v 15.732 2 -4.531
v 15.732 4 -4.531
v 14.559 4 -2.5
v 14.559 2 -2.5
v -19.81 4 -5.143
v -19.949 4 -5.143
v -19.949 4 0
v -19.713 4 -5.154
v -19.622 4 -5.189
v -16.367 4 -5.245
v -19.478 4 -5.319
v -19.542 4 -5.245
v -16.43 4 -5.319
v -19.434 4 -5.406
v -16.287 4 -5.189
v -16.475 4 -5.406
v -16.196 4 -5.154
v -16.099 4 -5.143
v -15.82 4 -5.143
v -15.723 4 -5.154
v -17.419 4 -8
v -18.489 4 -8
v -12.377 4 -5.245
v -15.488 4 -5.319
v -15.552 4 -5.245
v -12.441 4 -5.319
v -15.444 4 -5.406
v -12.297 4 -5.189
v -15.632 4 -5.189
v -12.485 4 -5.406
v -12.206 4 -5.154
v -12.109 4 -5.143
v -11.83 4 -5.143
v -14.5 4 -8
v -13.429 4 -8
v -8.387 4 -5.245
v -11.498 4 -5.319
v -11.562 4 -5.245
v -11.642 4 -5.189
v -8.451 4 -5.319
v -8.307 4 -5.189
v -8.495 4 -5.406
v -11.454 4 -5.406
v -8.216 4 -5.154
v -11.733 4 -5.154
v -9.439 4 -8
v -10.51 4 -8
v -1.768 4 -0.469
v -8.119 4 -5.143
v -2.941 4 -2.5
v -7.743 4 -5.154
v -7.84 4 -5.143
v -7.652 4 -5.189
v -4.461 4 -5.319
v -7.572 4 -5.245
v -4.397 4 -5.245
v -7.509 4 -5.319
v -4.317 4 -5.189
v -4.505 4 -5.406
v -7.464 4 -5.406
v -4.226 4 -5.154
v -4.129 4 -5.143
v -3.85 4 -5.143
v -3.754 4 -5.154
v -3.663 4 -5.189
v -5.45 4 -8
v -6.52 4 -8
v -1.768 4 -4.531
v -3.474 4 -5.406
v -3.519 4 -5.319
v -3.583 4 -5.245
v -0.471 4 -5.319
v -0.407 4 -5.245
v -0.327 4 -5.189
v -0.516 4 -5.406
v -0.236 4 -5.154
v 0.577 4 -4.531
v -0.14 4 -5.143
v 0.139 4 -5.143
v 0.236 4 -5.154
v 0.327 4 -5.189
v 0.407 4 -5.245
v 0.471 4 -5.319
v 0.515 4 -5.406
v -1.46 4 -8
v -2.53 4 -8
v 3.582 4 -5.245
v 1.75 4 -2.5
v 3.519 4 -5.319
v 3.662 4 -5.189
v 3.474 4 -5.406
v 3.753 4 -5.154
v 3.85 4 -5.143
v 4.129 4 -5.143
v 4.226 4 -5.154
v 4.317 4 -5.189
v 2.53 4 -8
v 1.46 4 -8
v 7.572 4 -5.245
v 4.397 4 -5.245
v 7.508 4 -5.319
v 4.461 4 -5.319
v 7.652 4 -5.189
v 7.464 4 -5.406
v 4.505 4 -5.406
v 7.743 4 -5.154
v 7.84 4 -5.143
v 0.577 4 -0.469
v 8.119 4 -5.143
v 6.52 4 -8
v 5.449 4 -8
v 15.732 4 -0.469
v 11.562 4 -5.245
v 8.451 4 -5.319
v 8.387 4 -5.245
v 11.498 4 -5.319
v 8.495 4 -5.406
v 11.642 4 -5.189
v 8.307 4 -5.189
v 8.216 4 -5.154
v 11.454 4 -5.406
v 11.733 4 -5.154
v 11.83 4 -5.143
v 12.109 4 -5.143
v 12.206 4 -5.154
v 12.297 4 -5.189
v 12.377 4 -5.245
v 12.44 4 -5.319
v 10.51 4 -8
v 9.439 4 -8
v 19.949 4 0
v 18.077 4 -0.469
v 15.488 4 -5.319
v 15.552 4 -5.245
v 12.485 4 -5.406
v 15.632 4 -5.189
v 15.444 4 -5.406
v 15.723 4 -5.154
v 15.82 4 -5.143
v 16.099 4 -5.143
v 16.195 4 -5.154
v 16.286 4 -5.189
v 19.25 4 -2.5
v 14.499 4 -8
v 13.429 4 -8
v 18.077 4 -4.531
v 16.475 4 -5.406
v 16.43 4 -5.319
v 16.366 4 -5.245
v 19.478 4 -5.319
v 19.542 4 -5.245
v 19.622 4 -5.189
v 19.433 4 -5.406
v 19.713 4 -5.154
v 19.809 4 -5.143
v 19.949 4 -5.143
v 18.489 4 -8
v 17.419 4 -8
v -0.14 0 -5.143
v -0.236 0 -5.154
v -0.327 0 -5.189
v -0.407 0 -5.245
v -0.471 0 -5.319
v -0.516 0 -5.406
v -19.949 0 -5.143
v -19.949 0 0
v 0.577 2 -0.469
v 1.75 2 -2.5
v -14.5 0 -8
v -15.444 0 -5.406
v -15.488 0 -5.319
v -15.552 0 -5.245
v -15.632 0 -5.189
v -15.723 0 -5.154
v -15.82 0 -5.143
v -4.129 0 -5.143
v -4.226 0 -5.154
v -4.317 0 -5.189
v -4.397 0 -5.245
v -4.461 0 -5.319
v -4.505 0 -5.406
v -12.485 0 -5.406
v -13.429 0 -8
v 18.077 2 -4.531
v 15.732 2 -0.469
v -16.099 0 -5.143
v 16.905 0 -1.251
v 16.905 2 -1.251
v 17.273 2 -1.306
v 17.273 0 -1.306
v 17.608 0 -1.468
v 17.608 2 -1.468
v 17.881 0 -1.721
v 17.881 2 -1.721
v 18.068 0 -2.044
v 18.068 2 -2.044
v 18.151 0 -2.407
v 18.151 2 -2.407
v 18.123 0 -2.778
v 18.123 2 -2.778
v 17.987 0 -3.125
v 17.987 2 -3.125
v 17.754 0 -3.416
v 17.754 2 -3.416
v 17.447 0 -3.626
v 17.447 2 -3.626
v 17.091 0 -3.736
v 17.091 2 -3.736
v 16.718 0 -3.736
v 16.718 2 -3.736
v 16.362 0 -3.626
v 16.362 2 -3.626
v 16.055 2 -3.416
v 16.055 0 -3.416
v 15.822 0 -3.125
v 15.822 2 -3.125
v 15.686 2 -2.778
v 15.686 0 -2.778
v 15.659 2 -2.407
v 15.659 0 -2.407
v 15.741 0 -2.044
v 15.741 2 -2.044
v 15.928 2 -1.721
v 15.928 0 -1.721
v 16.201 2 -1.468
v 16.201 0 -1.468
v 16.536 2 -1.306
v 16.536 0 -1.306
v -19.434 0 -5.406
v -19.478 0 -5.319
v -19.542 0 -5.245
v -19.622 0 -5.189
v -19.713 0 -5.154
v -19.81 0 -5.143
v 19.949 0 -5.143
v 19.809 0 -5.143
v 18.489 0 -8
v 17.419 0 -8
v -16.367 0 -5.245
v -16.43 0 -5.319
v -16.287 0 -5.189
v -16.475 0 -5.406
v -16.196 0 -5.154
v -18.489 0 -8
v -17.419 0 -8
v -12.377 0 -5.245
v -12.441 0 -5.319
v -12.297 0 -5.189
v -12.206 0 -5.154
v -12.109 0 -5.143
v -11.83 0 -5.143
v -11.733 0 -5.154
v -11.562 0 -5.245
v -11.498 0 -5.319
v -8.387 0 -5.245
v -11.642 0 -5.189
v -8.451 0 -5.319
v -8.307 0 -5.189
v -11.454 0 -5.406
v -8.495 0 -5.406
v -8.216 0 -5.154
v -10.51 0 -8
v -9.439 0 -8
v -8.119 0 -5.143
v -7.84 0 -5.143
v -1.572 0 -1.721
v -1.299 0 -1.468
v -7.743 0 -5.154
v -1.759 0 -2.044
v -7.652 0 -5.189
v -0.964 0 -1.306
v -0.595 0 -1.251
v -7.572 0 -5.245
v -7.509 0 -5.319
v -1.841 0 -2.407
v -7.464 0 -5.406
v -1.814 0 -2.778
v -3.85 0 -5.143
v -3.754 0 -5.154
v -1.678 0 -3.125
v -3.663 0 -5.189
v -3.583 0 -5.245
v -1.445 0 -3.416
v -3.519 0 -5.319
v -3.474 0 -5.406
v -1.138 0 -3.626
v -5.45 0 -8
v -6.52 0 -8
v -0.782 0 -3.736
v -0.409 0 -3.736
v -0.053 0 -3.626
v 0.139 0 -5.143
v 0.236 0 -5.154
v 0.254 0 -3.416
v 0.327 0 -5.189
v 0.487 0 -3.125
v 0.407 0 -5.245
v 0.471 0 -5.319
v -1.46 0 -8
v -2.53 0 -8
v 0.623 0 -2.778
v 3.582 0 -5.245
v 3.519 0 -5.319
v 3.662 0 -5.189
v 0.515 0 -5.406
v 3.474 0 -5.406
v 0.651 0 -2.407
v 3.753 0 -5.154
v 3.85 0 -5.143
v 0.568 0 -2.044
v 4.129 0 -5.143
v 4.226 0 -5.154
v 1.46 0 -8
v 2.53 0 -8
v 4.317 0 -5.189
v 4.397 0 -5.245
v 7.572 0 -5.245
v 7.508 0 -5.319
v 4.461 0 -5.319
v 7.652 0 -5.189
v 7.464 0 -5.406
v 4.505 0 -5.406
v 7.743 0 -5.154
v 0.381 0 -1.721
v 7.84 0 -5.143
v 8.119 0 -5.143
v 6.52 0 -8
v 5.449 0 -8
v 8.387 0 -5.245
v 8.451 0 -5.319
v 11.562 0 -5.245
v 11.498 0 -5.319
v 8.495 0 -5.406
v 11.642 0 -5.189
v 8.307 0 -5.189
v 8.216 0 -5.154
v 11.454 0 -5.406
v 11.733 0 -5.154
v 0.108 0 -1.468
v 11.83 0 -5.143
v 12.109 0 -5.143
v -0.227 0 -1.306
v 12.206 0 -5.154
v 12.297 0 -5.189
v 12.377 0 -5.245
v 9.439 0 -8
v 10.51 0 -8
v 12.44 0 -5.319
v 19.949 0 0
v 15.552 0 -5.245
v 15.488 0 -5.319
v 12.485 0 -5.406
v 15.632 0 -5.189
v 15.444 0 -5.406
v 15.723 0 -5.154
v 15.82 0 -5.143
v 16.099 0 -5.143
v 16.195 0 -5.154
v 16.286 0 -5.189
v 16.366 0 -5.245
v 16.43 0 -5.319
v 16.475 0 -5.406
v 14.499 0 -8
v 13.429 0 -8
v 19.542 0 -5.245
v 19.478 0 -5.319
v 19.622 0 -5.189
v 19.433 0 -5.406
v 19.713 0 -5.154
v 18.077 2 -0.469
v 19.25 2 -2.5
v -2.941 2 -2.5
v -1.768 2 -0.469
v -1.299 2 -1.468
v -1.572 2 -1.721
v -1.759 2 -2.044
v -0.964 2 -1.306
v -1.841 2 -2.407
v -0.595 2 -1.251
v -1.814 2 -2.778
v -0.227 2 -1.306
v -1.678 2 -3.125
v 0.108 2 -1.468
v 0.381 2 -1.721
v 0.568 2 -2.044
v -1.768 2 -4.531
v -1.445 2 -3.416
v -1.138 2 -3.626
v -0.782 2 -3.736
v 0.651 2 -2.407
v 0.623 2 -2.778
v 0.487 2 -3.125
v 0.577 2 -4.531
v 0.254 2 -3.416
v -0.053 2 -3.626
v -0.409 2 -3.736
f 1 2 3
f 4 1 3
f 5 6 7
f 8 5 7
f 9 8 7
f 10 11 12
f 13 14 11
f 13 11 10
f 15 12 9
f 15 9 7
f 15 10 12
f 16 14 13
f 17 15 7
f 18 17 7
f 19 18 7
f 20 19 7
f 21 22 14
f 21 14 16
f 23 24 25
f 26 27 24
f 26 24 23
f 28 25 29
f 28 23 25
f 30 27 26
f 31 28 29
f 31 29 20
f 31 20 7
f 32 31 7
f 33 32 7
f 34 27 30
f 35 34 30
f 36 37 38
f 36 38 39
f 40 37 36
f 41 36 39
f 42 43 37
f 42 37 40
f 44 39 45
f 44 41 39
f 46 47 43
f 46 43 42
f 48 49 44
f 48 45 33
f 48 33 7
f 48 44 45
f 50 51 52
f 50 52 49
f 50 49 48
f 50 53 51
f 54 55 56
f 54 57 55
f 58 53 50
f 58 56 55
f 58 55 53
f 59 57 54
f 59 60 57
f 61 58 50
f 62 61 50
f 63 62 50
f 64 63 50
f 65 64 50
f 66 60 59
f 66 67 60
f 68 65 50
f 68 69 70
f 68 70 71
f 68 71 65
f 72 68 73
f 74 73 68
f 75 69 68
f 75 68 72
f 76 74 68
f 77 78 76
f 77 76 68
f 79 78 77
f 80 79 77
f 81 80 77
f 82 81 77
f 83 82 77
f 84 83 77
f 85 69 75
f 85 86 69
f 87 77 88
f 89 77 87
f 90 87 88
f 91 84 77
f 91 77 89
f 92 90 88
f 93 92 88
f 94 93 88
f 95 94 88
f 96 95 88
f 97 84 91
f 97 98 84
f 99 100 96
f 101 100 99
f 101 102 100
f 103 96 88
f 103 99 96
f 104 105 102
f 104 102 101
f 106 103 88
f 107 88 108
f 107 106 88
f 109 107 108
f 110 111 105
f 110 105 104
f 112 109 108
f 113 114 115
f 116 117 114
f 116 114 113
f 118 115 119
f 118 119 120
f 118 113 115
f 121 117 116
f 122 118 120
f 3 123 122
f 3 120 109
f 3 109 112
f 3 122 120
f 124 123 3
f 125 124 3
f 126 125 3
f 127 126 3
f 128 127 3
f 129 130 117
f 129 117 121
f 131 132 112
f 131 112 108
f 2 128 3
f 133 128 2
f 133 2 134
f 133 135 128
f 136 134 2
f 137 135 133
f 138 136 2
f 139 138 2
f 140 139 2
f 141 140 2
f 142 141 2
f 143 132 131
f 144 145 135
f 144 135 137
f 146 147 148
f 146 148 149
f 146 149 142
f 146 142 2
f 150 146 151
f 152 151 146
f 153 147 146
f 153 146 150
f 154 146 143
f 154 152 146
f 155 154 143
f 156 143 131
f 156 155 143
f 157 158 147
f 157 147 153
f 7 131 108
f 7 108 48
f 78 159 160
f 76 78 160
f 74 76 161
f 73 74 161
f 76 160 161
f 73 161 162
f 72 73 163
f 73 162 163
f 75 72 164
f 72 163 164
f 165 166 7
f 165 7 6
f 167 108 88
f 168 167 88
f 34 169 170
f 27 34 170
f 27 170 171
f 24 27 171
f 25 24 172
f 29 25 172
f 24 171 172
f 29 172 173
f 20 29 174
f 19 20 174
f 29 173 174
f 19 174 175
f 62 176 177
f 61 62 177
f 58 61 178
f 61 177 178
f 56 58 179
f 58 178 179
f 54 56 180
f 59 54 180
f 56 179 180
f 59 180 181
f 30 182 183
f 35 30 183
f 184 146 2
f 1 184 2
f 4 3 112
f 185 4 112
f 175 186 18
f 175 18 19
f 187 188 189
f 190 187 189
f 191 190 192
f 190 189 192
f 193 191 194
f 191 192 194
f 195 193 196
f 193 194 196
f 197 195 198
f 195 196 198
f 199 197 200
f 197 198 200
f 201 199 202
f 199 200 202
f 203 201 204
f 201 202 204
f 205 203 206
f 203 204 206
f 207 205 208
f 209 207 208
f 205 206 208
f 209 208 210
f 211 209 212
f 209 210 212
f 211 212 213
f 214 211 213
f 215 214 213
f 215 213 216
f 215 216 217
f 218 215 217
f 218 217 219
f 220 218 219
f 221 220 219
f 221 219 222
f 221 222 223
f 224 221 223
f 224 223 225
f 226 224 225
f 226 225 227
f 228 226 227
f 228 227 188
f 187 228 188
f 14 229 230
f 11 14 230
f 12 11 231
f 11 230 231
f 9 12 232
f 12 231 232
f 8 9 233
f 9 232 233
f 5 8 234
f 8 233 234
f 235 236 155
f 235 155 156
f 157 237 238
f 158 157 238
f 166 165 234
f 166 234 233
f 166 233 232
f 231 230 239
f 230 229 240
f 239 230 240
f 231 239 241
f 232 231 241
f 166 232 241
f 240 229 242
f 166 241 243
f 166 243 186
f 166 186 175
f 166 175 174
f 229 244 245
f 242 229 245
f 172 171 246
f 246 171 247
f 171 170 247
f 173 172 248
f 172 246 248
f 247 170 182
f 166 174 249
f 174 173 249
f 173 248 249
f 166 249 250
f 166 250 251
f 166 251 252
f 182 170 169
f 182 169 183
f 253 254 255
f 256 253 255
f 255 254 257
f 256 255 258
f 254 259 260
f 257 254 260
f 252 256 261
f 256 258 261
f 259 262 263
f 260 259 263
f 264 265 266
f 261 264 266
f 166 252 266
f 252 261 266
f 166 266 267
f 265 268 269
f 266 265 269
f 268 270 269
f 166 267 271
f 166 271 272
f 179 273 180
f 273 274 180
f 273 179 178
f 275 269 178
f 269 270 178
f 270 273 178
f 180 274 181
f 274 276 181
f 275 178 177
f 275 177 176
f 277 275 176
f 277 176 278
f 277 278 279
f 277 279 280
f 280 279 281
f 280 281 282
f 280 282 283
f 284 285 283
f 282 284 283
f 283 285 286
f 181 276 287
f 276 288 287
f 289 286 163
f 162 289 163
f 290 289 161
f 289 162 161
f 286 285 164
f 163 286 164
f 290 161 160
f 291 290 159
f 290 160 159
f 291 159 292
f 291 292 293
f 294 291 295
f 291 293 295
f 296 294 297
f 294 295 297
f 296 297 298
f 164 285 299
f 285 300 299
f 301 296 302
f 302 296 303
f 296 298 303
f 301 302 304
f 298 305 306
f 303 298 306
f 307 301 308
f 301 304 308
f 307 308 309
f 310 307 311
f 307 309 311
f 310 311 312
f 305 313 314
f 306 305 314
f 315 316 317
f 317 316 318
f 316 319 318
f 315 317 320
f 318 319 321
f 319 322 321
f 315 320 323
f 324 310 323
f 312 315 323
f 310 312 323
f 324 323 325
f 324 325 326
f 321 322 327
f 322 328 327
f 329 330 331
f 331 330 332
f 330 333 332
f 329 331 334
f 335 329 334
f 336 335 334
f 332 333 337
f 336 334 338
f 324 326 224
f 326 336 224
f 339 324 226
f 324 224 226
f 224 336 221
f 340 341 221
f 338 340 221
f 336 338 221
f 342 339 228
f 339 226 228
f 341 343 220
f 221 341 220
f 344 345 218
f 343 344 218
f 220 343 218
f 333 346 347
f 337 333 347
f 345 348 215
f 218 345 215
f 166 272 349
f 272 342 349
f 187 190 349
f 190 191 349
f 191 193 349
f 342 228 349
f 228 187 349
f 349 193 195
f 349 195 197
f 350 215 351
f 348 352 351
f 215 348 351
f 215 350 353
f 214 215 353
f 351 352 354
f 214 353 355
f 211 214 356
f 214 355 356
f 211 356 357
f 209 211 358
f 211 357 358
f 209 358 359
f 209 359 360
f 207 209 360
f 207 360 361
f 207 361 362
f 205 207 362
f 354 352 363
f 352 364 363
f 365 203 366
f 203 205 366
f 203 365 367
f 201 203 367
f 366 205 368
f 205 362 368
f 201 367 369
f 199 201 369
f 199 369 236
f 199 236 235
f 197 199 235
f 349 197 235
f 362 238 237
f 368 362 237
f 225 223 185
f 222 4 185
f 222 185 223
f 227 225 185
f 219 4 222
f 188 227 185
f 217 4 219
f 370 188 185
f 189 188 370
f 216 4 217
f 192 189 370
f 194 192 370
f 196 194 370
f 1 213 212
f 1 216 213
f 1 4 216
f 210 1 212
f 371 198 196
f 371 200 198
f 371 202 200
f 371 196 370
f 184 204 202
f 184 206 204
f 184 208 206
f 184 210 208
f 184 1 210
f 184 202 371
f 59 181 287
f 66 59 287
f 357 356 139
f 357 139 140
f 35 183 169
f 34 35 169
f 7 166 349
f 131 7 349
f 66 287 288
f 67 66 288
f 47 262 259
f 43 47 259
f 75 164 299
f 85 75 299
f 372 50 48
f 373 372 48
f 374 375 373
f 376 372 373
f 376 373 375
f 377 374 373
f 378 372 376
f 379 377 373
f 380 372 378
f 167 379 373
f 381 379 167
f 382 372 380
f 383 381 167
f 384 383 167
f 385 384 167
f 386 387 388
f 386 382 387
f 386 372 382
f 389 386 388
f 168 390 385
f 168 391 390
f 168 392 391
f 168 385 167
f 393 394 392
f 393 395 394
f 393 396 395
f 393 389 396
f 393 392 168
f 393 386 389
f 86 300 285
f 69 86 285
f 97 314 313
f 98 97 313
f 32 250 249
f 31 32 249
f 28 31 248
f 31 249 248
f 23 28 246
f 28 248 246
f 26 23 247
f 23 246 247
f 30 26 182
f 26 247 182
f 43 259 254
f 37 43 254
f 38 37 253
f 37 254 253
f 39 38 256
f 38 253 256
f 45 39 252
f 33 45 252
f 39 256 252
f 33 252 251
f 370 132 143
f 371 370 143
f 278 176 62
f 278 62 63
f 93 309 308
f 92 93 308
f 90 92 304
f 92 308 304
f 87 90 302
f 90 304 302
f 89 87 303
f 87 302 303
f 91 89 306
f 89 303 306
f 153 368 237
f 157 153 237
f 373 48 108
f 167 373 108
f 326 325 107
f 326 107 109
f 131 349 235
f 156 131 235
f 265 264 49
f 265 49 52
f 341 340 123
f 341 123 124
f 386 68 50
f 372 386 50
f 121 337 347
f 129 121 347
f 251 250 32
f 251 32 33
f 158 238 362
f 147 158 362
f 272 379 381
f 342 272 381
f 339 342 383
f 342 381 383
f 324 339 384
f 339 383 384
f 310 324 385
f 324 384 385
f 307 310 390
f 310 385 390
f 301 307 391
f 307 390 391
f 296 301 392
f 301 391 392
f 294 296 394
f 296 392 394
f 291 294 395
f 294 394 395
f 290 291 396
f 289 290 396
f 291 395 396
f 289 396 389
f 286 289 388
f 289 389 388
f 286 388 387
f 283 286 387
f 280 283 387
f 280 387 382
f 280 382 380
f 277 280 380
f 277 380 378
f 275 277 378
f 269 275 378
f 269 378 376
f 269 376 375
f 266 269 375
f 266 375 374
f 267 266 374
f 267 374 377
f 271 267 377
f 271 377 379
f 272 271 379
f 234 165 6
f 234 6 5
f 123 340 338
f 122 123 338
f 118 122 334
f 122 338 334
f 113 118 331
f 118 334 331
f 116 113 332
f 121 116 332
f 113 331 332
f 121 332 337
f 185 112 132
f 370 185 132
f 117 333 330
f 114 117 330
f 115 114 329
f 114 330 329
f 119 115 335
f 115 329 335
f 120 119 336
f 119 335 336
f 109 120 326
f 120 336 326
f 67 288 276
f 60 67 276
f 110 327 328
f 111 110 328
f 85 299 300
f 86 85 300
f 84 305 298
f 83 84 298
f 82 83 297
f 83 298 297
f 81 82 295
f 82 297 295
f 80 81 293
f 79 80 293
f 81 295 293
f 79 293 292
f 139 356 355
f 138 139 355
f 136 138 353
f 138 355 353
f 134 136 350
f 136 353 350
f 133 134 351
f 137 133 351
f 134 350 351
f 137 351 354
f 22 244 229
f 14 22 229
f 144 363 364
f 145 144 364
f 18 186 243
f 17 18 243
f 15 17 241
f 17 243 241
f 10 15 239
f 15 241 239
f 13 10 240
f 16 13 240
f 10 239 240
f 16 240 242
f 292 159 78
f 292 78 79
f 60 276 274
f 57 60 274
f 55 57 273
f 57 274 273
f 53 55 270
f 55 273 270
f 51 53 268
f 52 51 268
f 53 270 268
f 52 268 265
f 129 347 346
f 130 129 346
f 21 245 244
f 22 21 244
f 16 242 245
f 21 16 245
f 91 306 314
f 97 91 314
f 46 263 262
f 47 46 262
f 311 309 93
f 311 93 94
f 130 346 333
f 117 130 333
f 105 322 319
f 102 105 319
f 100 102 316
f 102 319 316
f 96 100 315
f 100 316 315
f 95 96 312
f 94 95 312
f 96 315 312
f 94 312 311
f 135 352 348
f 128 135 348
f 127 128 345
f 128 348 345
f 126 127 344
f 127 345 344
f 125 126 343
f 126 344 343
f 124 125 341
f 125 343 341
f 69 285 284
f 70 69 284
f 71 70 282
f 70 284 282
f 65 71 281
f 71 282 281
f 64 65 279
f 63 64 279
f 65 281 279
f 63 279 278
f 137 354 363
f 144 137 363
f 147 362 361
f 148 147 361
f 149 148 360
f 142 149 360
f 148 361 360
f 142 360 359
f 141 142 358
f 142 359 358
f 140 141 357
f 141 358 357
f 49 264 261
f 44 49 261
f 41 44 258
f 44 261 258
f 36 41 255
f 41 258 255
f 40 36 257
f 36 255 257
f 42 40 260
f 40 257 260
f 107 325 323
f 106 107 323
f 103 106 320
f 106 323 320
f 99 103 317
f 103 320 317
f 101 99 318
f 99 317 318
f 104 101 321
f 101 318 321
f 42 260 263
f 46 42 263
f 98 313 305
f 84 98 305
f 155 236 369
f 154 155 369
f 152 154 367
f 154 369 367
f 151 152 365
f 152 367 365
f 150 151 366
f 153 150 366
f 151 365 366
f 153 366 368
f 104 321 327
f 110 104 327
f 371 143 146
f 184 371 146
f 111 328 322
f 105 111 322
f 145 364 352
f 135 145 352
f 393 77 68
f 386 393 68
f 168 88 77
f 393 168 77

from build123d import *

# Parameters (mm, degrees)
SKETCH1_W           = 39.8982184
SKETCH1_H           = 5.1425094
BOSS_EXTRUDE1_DEPTH = 3.999992
BOSS_EXTRUDE2_START = -3.999992
BOSS_EXTRUDE2_DEPTH = 3.999992
CUT_EXTRUDE4_DEPTH  = 1.999996
SKETCH4_R           = 1.2494895
CUT_EXTRUDE5_DEPTH  = 22.586264202


# Read off the part's stored shape, not the designer's step: Boss-Extrude2
with BuildPart() as part:
    # Sketch1 → Boss-Extrude1 (new body)
    with BuildSketch(Plane(origin=(0, 0, 0), x_dir=(1, 0, 0), z_dir=(0, 1, 0))):
        with Locations((0, 2.5712547)):
            Rectangle(SKETCH1_W, SKETCH1_H)
    extrude(amount=BOSS_EXTRUDE1_DEPTH)

    # Boss-Extrude2 outline → Boss-Extrude2 (add)
    with BuildSketch(Plane(origin=(0, 3.999992, 0), x_dir=(1, 0, 0), z_dir=(0, 1, 0)).offset(BOSS_EXTRUDE2_START)):
        with BuildLine():
            Line((-19.809521572, 5.1425094), (-16.098890229, 5.1425094))
            ThreePointArc((-16.098890229, 5.1425094), (-16.328307217, 5.214844403), (-16.4747448, 5.405686069))
            Line((-16.4747448, 5.405686069), (-17.4189898, 7.999991269))
            Line((-17.4189898, 7.999991269), (-18.489422, 7.999991269))
            Line((-18.489422, 7.999991269), (-19.433667, 5.405686069))
            ThreePointArc((-19.433667, 5.405686069), (-19.580104584, 5.214844403), (-19.809521572, 5.1425094))
        make_face()
        with BuildLine():
            Line((-15.819722635, 5.1425094), (-12.109091292, 5.1425094))
            ThreePointArc((-12.109091292, 5.1425094), (-12.33850828, 5.214844403), (-12.484945863, 5.405686069))
            Line((-12.484945863, 5.405686069), (-13.429190863, 7.999991269))
            Line((-13.429190863, 7.999991269), (-14.499623063, 7.999991269))
            Line((-14.499623063, 7.999991269), (-15.443868063, 5.405686069))
            ThreePointArc((-15.443868063, 5.405686069), (-15.590305646, 5.214844403), (-15.819722635, 5.1425094))
        make_face()
        with BuildLine():
            Line((-11.829923697, 5.1425094), (-8.119292355, 5.1425094))
            ThreePointArc((-8.119292355, 5.1425094), (-8.348709343, 5.214844403), (-8.495146926, 5.405686069))
            Line((-8.495146926, 5.405686069), (-9.439391926, 7.999991269))
            Line((-9.439391926, 7.999991269), (-10.509824126, 7.999991269))
            Line((-10.509824126, 7.999991269), (-11.454069126, 5.405686069))
            ThreePointArc((-11.454069126, 5.405686069), (-11.600506709, 5.214844403), (-11.829923697, 5.1425094))
        make_face()
        with BuildLine():
            Line((-7.84012476, 5.1425094), (-4.129493418, 5.1425094))
            ThreePointArc((-4.129493418, 5.1425094), (-4.358910406, 5.214844403), (-4.505347989, 5.405686069))
            Line((-4.505347989, 5.405686069), (-5.449592989, 7.999991269))
            Line((-5.449592989, 7.999991269), (-6.520025189, 7.999991269))
            Line((-6.520025189, 7.999991269), (-7.464270189, 5.405686069))
            ThreePointArc((-7.464270189, 5.405686069), (-7.610707772, 5.214844403), (-7.84012476, 5.1425094))
        make_face()
        with BuildLine():
            Line((-3.850325823, 5.1425094), (-0.13969448, 5.1425094))
            ThreePointArc((-0.13969448, 5.1425094), (-0.369111469, 5.214844403), (-0.515549052, 5.405686069))
            Line((-0.515549052, 5.405686069), (-1.459794052, 7.999991269))
            Line((-1.459794052, 7.999991269), (-2.530226252, 7.999991269))
            Line((-2.530226252, 7.999991269), (-3.474471252, 5.405686069))
            ThreePointArc((-3.474471252, 5.405686069), (-3.620908835, 5.214844403), (-3.850325823, 5.1425094))
        make_face()
        with BuildLine():
            Line((0.139473114, 5.1425094), (3.850104457, 5.1425094))
            ThreePointArc((3.850104457, 5.1425094), (3.620687469, 5.214844403), (3.474249885, 5.405686069))
            Line((3.474249885, 5.405686069), (2.530004885, 7.999991269))
            Line((2.530004885, 7.999991269), (1.459572685, 7.999991269))
            Line((1.459572685, 7.999991269), (0.515327685, 5.405686069))
            ThreePointArc((0.515327685, 5.405686069), (0.368890102, 5.214844403), (0.139473114, 5.1425094))
        make_face()
        with BuildLine():
            Line((4.129272051, 5.1425094), (7.839903394, 5.1425094))
            ThreePointArc((7.839903394, 5.1425094), (7.610486406, 5.214844403), (7.464048822, 5.405686069))
            Line((7.464048822, 5.405686069), (6.519803822, 7.999991269))
            Line((6.519803822, 7.999991269), (5.449371622, 7.999991269))
            Line((5.449371622, 7.999991269), (4.505126622, 5.405686069))
            ThreePointArc((4.505126622, 5.405686069), (4.358689039, 5.214844403), (4.129272051, 5.1425094))
        make_face()
        with BuildLine():
            Line((8.119070988, 5.1425094), (11.829702331, 5.1425094))
            ThreePointArc((11.829702331, 5.1425094), (11.600285343, 5.214844403), (11.45384776, 5.405686069))
            Line((11.45384776, 5.405686069), (10.50960276, 7.999991269))
            Line((10.50960276, 7.999991269), (9.43917056, 7.999991269))
            Line((9.43917056, 7.999991269), (8.49492556, 5.405686069))
            ThreePointArc((8.49492556, 5.405686069), (8.348487976, 5.214844403), (8.119070988, 5.1425094))
        make_face()
        with BuildLine():
            Line((12.108869925, 5.1425094), (15.819501268, 5.1425094))
            ThreePointArc((15.819501268, 5.1425094), (15.59008428, 5.214844403), (15.443646697, 5.405686069))
            Line((15.443646697, 5.405686069), (14.499401697, 7.999991269))
            Line((14.499401697, 7.999991269), (13.428969497, 7.999991269))
            Line((13.428969497, 7.999991269), (12.484724497, 5.405686069))
            ThreePointArc((12.484724497, 5.405686069), (12.338286913, 5.214844403), (12.108869925, 5.1425094))
        make_face()
        with BuildLine():
            ThreePointArc((19.809300205, 5.1425094), (19.579883217, 5.214844403), (19.433445634, 5.405686069))
            Line((19.433445634, 5.405686069), (18.489200634, 7.999991269))
            Line((18.489200634, 7.999991269), (17.418768434, 7.999991269))
            Line((17.418768434, 7.999991269), (16.474523434, 5.405686069))
            ThreePointArc((16.474523434, 5.405686069), (16.328085851, 5.214844403), (16.098668862, 5.1425094))
            Line((16.098668862, 5.1425094), (19.809300205, 5.1425094))
        make_face()
    extrude(amount=BOSS_EXTRUDE2_DEPTH)

    # Sketch3 → Cut-Extrude4 (cut)
    with BuildSketch(Plane(origin=(0, 3.999992, 0), x_dir=(1, 0, 0), z_dir=(0, 1, 0))):
        Polygon((19.2496186, 2.5000077), (18.0770657, 4.530928897), (15.7319599, 4.530928897), (14.559407, 2.5000077), (15.7319599, 0.469086503), (18.0770657, 0.469086503), align=None)
        Polygon((1.7496282, 2.5000077), (0.5770753, 4.530928897), (-1.7680305, 4.530928897), (-2.9405834, 2.5000077), (-1.7680305, 0.469086503), (0.5770753, 0.469086503), align=None)
    extrude(amount=-CUT_EXTRUDE4_DEPTH, mode=Mode.SUBTRACT)

    # Sketch4 → Cut-Extrude5 (cut, through all)
    with BuildSketch(Plane(origin=(0, 1.999996, 0), x_dir=(1, 0, 0), z_dir=(0, 1, 0))):
        with Locations(Location((16.9045128, 2.5000077, 0), (0, 0, 270))):
            Circle(SKETCH4_R)
        with Locations(Location((-0.5954776, 2.5000077, 0), (0, 0, 270))):
            Circle(SKETCH4_R)
    extrude(amount=-CUT_EXTRUDE5_DEPTH, mode=Mode.SUBTRACT)


solid = part.part
